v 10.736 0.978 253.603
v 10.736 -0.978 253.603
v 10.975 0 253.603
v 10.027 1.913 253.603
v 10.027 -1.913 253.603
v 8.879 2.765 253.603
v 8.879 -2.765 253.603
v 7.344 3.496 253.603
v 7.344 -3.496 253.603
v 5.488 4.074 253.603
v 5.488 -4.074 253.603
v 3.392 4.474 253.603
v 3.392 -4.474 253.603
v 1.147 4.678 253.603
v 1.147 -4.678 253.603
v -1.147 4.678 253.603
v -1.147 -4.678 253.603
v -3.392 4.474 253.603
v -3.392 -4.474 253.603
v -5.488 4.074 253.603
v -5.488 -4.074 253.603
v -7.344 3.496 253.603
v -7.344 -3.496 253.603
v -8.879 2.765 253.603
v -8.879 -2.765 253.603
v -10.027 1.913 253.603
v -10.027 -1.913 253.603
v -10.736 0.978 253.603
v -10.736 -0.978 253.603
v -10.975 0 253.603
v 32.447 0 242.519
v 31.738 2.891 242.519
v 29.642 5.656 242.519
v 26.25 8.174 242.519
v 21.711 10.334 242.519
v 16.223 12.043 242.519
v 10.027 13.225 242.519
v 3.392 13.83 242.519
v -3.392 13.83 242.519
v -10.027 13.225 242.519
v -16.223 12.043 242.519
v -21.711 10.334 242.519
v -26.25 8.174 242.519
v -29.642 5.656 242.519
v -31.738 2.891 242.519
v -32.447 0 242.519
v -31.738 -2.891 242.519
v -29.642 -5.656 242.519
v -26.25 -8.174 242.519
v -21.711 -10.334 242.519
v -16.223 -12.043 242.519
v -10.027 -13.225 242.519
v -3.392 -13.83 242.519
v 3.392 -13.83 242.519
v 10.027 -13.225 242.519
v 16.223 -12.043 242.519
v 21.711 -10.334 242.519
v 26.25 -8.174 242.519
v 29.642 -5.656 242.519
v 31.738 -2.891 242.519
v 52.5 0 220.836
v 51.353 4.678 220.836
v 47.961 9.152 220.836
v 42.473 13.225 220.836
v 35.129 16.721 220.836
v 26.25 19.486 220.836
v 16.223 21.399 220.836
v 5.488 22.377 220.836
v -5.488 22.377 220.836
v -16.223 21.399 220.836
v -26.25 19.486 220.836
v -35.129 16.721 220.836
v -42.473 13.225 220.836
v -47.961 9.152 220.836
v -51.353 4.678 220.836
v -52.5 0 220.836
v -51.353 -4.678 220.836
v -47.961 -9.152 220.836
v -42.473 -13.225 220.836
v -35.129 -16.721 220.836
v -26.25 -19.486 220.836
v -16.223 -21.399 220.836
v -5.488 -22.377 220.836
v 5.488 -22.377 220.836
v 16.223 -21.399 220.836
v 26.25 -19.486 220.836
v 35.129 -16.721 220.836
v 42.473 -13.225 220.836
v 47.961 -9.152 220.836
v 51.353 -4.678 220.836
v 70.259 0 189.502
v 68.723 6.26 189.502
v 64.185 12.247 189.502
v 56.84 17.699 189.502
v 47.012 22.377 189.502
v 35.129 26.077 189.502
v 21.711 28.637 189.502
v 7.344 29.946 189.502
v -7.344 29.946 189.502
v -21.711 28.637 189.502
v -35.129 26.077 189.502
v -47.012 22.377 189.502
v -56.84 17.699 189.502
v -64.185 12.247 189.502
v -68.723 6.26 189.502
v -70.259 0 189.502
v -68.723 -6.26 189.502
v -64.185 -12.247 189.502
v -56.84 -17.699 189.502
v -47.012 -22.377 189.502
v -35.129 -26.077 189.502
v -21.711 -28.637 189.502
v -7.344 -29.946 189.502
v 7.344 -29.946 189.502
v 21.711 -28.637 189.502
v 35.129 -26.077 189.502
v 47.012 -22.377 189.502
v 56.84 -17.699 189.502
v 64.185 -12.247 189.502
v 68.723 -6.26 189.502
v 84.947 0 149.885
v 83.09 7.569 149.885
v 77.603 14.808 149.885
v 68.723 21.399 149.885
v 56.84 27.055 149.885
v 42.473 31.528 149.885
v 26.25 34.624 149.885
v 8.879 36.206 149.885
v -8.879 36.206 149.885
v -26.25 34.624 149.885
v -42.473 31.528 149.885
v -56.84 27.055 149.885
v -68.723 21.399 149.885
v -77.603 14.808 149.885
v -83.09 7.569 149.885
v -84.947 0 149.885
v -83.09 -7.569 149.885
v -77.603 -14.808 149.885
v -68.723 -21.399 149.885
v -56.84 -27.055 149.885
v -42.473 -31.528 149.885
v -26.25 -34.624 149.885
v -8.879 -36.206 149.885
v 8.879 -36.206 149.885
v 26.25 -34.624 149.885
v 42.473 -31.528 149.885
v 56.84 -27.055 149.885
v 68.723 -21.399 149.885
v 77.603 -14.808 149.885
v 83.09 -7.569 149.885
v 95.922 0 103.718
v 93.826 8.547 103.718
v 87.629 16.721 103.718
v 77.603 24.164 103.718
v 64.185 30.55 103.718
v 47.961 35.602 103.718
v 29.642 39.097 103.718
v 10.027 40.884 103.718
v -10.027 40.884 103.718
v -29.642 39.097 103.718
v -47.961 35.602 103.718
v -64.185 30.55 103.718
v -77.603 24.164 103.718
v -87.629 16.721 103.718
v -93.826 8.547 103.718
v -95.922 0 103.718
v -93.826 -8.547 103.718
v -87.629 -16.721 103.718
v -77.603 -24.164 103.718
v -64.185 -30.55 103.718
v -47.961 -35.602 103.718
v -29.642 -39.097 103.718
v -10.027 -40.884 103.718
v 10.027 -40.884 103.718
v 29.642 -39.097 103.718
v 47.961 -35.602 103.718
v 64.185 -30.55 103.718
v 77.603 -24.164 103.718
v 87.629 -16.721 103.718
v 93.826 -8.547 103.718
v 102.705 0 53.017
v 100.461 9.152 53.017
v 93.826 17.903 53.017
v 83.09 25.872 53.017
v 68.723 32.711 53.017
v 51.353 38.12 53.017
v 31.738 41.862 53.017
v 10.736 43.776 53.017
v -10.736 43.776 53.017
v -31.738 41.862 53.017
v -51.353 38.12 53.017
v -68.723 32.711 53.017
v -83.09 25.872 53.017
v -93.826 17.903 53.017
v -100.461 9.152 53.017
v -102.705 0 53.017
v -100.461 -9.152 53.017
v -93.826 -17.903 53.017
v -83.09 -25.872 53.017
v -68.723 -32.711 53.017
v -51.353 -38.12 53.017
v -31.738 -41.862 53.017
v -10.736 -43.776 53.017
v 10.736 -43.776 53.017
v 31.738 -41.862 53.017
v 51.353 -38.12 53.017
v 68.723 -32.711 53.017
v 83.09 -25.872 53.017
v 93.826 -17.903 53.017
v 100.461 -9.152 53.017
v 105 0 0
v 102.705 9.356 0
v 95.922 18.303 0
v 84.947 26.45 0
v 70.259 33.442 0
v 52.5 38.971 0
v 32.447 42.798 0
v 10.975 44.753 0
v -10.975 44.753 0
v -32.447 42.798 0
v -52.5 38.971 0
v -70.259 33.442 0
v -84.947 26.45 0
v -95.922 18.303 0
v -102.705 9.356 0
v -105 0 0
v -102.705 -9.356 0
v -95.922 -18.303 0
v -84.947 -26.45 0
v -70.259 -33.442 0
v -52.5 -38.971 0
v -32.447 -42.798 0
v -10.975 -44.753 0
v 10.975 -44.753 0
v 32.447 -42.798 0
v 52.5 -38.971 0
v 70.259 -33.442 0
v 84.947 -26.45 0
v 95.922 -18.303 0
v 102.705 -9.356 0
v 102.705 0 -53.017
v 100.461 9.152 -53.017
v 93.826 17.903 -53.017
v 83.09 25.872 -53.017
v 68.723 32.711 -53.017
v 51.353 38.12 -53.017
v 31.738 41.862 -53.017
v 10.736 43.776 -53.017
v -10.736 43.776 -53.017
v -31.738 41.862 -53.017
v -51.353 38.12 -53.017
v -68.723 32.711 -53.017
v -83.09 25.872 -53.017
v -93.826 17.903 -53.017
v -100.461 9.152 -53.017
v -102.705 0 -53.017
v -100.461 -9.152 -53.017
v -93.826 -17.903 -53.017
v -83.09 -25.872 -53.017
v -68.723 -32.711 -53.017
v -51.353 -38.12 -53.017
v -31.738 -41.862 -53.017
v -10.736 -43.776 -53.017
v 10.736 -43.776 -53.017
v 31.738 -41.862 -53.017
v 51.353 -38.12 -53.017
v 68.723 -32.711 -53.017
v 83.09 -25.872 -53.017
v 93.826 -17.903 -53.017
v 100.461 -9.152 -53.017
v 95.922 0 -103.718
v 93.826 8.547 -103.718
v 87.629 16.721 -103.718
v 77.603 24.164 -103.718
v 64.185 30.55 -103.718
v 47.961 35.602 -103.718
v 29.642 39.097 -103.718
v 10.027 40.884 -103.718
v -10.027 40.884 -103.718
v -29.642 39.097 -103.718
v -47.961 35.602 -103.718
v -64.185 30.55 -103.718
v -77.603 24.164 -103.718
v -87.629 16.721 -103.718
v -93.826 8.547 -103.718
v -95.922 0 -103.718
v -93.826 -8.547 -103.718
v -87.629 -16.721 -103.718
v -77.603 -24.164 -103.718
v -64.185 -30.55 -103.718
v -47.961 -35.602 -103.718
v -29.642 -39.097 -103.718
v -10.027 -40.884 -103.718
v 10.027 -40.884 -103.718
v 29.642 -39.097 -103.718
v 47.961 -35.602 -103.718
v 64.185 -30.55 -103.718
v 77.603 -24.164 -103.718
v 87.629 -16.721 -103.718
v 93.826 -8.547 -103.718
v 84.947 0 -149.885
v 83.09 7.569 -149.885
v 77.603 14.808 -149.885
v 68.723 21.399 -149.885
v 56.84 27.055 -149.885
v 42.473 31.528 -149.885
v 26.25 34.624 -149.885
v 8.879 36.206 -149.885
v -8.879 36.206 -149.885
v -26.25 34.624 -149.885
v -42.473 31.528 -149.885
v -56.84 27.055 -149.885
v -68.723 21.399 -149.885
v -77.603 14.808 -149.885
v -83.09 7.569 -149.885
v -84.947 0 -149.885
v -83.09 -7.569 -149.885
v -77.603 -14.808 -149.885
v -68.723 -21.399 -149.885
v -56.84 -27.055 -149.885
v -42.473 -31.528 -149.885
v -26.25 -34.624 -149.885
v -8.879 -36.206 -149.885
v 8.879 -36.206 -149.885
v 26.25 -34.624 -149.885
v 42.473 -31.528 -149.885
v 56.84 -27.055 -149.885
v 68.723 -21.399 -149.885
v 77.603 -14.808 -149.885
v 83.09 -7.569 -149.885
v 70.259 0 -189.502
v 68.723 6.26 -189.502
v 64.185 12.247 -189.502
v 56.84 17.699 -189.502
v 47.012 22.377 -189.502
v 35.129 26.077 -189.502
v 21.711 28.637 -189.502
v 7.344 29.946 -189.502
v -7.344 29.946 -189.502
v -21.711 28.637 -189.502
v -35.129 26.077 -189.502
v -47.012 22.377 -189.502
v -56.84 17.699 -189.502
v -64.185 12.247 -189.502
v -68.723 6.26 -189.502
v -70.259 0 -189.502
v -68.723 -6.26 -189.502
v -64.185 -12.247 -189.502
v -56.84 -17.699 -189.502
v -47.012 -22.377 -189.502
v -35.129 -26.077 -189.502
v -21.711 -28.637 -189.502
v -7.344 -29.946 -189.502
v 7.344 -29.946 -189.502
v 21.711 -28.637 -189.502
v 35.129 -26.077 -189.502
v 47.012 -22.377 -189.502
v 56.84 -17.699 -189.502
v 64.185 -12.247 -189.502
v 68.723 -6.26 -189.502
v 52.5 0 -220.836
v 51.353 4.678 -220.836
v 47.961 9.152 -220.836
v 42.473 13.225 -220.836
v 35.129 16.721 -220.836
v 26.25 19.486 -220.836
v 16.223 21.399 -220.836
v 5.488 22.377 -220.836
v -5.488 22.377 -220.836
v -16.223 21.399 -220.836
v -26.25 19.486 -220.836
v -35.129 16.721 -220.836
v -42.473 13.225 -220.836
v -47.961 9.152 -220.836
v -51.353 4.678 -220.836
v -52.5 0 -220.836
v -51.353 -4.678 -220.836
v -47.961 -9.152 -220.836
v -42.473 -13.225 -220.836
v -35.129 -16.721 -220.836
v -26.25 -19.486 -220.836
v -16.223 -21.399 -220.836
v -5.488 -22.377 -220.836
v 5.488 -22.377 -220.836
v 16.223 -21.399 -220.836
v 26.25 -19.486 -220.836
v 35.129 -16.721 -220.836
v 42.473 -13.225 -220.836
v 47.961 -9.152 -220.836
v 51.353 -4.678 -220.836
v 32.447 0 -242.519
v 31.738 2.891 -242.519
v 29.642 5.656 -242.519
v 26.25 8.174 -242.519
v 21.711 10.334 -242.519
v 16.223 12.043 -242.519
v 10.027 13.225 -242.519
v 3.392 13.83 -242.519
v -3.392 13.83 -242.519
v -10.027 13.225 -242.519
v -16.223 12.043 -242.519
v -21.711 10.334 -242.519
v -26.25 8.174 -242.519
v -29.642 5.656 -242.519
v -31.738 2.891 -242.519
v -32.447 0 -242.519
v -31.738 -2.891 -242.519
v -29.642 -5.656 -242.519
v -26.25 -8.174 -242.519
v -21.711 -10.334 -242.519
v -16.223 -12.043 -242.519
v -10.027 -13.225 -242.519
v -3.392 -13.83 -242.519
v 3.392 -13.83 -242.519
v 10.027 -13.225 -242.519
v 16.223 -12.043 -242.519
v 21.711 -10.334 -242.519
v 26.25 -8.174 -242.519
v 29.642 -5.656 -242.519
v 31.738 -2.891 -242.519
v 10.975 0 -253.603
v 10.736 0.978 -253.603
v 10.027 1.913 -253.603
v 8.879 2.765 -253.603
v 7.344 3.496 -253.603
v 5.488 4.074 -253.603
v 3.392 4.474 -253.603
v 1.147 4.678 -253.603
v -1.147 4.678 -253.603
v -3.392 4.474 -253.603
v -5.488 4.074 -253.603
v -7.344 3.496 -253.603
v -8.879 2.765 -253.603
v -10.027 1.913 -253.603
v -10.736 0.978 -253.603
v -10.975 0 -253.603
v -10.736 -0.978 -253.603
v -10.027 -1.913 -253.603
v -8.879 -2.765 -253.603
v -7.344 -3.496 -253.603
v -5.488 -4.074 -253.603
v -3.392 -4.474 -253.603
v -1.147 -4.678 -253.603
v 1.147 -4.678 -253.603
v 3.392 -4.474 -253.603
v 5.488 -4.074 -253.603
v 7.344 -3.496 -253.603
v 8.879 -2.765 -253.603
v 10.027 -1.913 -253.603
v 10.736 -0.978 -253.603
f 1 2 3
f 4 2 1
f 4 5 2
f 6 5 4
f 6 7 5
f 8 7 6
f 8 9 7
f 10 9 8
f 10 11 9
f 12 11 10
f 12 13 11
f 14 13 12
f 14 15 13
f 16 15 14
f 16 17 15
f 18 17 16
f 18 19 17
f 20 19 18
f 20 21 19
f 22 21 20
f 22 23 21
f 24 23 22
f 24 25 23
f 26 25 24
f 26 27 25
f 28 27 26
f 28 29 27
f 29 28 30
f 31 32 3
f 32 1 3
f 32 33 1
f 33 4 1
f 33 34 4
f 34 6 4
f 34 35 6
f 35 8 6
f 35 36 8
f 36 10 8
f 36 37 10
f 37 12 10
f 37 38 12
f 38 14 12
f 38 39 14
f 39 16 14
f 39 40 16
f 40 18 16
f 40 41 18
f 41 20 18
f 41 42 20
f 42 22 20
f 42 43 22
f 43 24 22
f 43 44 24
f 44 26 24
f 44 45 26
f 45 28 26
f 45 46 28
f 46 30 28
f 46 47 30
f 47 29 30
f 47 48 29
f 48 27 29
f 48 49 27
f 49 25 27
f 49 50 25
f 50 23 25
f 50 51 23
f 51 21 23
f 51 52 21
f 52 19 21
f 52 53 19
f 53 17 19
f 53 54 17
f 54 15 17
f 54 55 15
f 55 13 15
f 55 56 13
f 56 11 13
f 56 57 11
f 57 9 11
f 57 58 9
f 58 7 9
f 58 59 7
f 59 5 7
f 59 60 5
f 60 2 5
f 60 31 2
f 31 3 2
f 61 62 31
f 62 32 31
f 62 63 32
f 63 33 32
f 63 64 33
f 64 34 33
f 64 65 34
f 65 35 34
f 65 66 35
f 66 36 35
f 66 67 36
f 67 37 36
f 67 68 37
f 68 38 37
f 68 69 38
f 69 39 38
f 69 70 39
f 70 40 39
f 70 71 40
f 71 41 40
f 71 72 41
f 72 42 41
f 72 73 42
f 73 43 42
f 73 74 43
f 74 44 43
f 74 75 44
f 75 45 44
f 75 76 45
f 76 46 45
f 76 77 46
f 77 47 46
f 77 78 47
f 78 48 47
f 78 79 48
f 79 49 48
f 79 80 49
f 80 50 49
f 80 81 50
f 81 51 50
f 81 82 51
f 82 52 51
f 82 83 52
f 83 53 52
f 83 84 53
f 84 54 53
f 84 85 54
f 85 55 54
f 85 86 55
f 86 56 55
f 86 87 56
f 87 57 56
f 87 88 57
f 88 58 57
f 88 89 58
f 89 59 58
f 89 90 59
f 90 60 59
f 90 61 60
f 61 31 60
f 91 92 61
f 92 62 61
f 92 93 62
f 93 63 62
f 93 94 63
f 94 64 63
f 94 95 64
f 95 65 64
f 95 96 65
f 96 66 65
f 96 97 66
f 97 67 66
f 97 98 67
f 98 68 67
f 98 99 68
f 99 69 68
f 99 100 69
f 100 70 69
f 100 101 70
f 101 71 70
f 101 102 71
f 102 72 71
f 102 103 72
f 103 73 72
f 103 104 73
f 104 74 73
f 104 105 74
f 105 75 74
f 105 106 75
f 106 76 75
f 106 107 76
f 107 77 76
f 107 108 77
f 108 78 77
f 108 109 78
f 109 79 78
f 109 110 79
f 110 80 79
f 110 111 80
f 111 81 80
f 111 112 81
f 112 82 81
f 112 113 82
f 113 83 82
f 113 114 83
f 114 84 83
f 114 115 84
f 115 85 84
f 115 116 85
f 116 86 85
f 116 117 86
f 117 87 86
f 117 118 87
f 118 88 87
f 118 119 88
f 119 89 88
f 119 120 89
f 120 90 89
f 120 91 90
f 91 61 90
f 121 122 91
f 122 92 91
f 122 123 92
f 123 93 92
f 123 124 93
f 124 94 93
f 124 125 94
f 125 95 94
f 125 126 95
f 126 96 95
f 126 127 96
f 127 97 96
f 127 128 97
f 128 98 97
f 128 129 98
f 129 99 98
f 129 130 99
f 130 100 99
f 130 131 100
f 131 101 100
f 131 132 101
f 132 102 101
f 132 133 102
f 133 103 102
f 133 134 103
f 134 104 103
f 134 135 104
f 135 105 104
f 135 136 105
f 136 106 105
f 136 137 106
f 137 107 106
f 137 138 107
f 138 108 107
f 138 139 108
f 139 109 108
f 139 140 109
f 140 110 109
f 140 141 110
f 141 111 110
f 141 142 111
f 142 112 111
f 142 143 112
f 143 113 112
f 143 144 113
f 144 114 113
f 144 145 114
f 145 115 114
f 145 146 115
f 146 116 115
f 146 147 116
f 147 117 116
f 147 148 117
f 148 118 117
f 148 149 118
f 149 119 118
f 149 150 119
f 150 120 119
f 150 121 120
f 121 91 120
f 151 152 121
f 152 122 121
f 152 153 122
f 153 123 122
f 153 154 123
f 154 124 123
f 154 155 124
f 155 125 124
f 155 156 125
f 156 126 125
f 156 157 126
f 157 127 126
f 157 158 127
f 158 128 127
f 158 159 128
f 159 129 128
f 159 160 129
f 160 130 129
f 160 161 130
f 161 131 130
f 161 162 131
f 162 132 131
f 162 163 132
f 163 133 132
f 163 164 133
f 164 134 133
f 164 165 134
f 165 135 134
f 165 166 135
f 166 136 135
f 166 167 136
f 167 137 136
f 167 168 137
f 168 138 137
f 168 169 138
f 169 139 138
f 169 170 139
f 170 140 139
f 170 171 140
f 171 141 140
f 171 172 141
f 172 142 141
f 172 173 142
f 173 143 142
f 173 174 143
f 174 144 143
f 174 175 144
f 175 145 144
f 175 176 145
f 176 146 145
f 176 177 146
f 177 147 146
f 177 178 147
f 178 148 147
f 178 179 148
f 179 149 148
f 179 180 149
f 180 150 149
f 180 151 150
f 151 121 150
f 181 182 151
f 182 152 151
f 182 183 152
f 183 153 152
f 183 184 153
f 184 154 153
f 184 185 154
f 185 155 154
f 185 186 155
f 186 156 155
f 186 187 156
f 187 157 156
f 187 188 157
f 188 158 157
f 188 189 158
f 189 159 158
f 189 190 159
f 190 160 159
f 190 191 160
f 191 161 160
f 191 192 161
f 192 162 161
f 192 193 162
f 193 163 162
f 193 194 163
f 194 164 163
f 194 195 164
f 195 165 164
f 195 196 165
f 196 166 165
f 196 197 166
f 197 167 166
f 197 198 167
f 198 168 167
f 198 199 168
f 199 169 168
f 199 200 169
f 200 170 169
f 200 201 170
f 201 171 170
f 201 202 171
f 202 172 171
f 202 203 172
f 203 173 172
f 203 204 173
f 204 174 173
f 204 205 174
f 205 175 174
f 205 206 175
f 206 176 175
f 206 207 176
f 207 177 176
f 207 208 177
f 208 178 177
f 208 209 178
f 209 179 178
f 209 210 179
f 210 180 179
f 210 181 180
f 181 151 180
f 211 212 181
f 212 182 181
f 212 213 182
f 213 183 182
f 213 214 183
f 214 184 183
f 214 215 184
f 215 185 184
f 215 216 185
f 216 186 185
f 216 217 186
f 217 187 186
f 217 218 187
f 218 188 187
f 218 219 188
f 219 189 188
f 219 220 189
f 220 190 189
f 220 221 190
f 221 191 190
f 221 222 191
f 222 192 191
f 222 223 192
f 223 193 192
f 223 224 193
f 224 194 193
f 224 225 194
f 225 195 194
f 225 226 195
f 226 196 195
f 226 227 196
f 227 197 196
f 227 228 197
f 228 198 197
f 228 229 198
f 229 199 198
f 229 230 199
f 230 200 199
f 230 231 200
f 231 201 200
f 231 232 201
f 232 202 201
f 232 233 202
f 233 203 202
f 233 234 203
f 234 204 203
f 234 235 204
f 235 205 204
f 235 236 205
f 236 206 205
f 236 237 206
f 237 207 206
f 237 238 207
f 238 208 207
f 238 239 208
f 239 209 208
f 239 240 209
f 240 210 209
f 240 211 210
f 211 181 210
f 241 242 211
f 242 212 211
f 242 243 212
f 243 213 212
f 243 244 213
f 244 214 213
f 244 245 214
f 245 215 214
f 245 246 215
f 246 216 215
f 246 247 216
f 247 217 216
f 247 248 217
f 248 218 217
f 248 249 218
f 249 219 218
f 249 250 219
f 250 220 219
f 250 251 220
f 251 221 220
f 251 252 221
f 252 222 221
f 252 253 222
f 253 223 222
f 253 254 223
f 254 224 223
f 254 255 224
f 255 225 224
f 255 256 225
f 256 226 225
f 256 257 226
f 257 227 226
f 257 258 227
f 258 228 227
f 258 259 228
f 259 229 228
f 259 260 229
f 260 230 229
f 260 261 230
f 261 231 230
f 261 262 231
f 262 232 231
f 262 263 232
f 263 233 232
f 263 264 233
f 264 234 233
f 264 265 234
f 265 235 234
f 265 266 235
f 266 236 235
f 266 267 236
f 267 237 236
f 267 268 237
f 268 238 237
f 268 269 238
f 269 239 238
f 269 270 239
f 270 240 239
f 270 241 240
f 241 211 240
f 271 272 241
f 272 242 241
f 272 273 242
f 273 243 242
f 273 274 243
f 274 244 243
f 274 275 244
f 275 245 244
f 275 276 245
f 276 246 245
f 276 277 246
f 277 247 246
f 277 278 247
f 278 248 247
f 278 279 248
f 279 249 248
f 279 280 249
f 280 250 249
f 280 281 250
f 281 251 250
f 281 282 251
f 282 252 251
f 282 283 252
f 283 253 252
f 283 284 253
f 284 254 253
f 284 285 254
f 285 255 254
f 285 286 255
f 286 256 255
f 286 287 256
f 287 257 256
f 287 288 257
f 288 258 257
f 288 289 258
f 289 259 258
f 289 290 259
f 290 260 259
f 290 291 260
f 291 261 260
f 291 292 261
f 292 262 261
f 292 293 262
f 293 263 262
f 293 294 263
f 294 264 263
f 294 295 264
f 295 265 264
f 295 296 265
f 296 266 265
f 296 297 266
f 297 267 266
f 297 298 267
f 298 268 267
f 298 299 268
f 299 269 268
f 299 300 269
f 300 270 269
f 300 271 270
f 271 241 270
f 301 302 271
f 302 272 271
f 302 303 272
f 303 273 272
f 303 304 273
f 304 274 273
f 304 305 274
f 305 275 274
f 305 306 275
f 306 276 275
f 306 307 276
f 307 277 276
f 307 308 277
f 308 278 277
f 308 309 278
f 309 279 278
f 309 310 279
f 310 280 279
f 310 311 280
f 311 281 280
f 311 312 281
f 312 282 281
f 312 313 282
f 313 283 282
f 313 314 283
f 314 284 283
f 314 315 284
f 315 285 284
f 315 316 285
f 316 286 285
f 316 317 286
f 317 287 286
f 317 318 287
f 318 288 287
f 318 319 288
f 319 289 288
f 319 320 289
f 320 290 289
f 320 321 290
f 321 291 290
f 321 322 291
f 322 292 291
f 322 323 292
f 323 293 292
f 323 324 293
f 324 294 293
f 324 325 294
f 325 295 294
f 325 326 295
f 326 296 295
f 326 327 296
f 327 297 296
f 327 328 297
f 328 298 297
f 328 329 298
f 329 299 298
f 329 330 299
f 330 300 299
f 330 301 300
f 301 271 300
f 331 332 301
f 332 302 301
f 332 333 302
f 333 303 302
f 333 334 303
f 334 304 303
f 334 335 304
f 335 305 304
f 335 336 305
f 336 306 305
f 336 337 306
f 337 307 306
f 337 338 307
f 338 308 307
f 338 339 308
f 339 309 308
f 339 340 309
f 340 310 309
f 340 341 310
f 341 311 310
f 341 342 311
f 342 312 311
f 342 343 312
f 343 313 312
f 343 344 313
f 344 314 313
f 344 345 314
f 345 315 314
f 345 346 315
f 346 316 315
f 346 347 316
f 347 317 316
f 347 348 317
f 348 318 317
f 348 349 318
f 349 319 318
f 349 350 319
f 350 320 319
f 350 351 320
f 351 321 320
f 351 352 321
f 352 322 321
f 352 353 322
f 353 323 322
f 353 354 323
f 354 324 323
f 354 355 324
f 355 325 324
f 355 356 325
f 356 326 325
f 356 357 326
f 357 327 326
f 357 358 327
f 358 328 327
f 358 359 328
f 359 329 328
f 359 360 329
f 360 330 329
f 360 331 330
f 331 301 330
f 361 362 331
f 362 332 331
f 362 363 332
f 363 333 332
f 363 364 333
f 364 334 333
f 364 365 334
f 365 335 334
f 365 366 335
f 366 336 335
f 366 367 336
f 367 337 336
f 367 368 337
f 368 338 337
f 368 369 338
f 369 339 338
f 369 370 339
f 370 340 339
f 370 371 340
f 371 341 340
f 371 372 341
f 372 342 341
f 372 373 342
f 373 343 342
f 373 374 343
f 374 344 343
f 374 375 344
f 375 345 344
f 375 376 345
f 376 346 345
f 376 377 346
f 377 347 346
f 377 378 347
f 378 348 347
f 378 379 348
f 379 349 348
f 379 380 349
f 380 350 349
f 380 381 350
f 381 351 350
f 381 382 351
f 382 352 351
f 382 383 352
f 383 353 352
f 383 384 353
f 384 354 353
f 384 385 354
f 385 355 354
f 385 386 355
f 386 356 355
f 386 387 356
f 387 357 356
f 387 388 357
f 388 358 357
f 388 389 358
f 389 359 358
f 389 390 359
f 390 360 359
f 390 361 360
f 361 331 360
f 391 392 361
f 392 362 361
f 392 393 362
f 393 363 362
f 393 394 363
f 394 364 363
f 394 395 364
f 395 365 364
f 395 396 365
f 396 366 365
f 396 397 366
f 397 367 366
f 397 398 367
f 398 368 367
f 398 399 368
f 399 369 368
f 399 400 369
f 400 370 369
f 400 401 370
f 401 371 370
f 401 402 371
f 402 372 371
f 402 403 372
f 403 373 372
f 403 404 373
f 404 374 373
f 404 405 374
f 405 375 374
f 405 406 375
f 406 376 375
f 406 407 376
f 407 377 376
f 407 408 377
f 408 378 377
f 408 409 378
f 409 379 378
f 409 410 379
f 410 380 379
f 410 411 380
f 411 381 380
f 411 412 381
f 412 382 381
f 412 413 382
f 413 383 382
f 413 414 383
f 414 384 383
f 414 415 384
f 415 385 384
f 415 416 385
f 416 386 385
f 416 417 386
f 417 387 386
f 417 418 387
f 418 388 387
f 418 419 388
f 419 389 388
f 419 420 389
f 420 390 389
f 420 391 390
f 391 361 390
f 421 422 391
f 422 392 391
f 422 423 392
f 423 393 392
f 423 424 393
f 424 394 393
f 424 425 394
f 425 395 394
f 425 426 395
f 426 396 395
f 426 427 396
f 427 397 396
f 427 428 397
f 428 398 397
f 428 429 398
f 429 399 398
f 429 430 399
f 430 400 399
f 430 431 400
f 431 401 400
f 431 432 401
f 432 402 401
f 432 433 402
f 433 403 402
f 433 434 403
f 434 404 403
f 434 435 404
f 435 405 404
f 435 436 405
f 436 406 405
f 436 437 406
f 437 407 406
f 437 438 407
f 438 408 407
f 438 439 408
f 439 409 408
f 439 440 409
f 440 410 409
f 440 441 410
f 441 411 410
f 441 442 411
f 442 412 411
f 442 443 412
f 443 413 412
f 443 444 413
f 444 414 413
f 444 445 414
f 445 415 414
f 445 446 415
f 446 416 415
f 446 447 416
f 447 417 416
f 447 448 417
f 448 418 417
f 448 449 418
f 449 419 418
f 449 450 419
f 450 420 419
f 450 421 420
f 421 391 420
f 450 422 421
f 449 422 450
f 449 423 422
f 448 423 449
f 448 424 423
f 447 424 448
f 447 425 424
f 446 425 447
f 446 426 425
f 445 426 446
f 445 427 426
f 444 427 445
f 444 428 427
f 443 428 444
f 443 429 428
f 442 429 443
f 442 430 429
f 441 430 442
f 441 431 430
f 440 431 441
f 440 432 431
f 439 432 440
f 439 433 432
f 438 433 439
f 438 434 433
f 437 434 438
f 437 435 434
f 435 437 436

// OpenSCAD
// Generated by SolidPython 1.0.1 on 2020-07-29 00:46:47


scale(v = [7, 3, 17]) {
	sphere(r = 15);
}
/***********************************************
*********      SolidPython code:      **********
************************************************
 
# import packages: SolidPython
from solid import *
from solid.utils import *
from itertools import chain, combinations, permutations


class Resize:

    def __init__(self, scad_file):
        self.scad_file = scad_file
        #self.scad_file = import_scad(scad_file)
        # cone/cylinder param:
        self.r1 = 0
        self.r2 = 0
        self.h = 0
        # rectangular prism param:
        self.w = 0
        self.l = 0
        # ellipse param:
        self.r = 0

    # import OpenScad code (file name corresponds to shape)


    # classify shape + parameters
    def assign(self, param1, param2, param3):
        if self.scad_file == 'cone.scad':
            self.r1 = param1
            self.r2 = param2
            self.h = param3
        elif self.scad_file == 'cylinder.scad':
            self.r1 = param1
            self.r2 = param2
            self.h = param3
        elif self.scad_file == 'rectangularPrism.scad':
            self.h = param1
            self.l = param2
            self.w = param3
        else:
            self.r = param1
            self.h = param2

    # resize parameters
    def iterate(self):
        x = range(3, 20, 2)
        i = 1
        if self.scad_file == 'cone.scad':
            tempList = list(permutations(x, 2))
            for temp in tempList:
                param1 = temp[0]
                param2 = temp[1]
                filepath = 'produced_scad_files/' + 'cone' + str(param1) + '_' + str(param2) + '_' + '.scad'
                scad_render_to_file(cylinder(h=param1, r1=param2, r2=0), filepath)

        elif self.scad_file == 'cylinder.scad':
            tempList = list(permutations(x, 3))
            for temp in tempList:
                param1 = temp[0]
                param2 = temp[1]
                filepath = 'produced_scad_files/' + 'cylinder' + str(param1) + '_' + str(param2) + '_' + '.scad'
                scad_render_to_file(cylinder(h=param1, r1=param2, r2=param2), filepath)

        elif self.scad_file == 'rectangularPrism.scad':
            tempList = list(permutations(x, 3))
            for temp in tempList:
                param1 = temp[0]
                param2 = temp[1]
                param3 = temp[2]
                filepath = 'produced_scad_files/' + 'rectangularPrism' + str(param1) + '_' + str(param2) + '_' + str(
                    param3) + '.scad'
                scad_render_to_file(cube(size=(param1, param2, param3)), filepath)

        elif self.scad_file == 'ellipse.scad':
            tempList = list(permutations(x, 4))
            for temp in tempList:
                param1 = temp[0]
                param2 = temp[1]
                param3 = temp[2]
                param4 = temp[3]
                filepath = 'produced_scad_files/' + 'ellipse' + str(param1) + '_' + str(param2) + '_' + str(param3) + '_' + str(param4) + '.scad'
                scad_render_to_file(scale([param1, param2, param3])(sphere(r=param4)), filepath)

    def render_to_scadfile(self):
        scad_render_to_file(scad, 'example.scad') 
 
************************************************/
